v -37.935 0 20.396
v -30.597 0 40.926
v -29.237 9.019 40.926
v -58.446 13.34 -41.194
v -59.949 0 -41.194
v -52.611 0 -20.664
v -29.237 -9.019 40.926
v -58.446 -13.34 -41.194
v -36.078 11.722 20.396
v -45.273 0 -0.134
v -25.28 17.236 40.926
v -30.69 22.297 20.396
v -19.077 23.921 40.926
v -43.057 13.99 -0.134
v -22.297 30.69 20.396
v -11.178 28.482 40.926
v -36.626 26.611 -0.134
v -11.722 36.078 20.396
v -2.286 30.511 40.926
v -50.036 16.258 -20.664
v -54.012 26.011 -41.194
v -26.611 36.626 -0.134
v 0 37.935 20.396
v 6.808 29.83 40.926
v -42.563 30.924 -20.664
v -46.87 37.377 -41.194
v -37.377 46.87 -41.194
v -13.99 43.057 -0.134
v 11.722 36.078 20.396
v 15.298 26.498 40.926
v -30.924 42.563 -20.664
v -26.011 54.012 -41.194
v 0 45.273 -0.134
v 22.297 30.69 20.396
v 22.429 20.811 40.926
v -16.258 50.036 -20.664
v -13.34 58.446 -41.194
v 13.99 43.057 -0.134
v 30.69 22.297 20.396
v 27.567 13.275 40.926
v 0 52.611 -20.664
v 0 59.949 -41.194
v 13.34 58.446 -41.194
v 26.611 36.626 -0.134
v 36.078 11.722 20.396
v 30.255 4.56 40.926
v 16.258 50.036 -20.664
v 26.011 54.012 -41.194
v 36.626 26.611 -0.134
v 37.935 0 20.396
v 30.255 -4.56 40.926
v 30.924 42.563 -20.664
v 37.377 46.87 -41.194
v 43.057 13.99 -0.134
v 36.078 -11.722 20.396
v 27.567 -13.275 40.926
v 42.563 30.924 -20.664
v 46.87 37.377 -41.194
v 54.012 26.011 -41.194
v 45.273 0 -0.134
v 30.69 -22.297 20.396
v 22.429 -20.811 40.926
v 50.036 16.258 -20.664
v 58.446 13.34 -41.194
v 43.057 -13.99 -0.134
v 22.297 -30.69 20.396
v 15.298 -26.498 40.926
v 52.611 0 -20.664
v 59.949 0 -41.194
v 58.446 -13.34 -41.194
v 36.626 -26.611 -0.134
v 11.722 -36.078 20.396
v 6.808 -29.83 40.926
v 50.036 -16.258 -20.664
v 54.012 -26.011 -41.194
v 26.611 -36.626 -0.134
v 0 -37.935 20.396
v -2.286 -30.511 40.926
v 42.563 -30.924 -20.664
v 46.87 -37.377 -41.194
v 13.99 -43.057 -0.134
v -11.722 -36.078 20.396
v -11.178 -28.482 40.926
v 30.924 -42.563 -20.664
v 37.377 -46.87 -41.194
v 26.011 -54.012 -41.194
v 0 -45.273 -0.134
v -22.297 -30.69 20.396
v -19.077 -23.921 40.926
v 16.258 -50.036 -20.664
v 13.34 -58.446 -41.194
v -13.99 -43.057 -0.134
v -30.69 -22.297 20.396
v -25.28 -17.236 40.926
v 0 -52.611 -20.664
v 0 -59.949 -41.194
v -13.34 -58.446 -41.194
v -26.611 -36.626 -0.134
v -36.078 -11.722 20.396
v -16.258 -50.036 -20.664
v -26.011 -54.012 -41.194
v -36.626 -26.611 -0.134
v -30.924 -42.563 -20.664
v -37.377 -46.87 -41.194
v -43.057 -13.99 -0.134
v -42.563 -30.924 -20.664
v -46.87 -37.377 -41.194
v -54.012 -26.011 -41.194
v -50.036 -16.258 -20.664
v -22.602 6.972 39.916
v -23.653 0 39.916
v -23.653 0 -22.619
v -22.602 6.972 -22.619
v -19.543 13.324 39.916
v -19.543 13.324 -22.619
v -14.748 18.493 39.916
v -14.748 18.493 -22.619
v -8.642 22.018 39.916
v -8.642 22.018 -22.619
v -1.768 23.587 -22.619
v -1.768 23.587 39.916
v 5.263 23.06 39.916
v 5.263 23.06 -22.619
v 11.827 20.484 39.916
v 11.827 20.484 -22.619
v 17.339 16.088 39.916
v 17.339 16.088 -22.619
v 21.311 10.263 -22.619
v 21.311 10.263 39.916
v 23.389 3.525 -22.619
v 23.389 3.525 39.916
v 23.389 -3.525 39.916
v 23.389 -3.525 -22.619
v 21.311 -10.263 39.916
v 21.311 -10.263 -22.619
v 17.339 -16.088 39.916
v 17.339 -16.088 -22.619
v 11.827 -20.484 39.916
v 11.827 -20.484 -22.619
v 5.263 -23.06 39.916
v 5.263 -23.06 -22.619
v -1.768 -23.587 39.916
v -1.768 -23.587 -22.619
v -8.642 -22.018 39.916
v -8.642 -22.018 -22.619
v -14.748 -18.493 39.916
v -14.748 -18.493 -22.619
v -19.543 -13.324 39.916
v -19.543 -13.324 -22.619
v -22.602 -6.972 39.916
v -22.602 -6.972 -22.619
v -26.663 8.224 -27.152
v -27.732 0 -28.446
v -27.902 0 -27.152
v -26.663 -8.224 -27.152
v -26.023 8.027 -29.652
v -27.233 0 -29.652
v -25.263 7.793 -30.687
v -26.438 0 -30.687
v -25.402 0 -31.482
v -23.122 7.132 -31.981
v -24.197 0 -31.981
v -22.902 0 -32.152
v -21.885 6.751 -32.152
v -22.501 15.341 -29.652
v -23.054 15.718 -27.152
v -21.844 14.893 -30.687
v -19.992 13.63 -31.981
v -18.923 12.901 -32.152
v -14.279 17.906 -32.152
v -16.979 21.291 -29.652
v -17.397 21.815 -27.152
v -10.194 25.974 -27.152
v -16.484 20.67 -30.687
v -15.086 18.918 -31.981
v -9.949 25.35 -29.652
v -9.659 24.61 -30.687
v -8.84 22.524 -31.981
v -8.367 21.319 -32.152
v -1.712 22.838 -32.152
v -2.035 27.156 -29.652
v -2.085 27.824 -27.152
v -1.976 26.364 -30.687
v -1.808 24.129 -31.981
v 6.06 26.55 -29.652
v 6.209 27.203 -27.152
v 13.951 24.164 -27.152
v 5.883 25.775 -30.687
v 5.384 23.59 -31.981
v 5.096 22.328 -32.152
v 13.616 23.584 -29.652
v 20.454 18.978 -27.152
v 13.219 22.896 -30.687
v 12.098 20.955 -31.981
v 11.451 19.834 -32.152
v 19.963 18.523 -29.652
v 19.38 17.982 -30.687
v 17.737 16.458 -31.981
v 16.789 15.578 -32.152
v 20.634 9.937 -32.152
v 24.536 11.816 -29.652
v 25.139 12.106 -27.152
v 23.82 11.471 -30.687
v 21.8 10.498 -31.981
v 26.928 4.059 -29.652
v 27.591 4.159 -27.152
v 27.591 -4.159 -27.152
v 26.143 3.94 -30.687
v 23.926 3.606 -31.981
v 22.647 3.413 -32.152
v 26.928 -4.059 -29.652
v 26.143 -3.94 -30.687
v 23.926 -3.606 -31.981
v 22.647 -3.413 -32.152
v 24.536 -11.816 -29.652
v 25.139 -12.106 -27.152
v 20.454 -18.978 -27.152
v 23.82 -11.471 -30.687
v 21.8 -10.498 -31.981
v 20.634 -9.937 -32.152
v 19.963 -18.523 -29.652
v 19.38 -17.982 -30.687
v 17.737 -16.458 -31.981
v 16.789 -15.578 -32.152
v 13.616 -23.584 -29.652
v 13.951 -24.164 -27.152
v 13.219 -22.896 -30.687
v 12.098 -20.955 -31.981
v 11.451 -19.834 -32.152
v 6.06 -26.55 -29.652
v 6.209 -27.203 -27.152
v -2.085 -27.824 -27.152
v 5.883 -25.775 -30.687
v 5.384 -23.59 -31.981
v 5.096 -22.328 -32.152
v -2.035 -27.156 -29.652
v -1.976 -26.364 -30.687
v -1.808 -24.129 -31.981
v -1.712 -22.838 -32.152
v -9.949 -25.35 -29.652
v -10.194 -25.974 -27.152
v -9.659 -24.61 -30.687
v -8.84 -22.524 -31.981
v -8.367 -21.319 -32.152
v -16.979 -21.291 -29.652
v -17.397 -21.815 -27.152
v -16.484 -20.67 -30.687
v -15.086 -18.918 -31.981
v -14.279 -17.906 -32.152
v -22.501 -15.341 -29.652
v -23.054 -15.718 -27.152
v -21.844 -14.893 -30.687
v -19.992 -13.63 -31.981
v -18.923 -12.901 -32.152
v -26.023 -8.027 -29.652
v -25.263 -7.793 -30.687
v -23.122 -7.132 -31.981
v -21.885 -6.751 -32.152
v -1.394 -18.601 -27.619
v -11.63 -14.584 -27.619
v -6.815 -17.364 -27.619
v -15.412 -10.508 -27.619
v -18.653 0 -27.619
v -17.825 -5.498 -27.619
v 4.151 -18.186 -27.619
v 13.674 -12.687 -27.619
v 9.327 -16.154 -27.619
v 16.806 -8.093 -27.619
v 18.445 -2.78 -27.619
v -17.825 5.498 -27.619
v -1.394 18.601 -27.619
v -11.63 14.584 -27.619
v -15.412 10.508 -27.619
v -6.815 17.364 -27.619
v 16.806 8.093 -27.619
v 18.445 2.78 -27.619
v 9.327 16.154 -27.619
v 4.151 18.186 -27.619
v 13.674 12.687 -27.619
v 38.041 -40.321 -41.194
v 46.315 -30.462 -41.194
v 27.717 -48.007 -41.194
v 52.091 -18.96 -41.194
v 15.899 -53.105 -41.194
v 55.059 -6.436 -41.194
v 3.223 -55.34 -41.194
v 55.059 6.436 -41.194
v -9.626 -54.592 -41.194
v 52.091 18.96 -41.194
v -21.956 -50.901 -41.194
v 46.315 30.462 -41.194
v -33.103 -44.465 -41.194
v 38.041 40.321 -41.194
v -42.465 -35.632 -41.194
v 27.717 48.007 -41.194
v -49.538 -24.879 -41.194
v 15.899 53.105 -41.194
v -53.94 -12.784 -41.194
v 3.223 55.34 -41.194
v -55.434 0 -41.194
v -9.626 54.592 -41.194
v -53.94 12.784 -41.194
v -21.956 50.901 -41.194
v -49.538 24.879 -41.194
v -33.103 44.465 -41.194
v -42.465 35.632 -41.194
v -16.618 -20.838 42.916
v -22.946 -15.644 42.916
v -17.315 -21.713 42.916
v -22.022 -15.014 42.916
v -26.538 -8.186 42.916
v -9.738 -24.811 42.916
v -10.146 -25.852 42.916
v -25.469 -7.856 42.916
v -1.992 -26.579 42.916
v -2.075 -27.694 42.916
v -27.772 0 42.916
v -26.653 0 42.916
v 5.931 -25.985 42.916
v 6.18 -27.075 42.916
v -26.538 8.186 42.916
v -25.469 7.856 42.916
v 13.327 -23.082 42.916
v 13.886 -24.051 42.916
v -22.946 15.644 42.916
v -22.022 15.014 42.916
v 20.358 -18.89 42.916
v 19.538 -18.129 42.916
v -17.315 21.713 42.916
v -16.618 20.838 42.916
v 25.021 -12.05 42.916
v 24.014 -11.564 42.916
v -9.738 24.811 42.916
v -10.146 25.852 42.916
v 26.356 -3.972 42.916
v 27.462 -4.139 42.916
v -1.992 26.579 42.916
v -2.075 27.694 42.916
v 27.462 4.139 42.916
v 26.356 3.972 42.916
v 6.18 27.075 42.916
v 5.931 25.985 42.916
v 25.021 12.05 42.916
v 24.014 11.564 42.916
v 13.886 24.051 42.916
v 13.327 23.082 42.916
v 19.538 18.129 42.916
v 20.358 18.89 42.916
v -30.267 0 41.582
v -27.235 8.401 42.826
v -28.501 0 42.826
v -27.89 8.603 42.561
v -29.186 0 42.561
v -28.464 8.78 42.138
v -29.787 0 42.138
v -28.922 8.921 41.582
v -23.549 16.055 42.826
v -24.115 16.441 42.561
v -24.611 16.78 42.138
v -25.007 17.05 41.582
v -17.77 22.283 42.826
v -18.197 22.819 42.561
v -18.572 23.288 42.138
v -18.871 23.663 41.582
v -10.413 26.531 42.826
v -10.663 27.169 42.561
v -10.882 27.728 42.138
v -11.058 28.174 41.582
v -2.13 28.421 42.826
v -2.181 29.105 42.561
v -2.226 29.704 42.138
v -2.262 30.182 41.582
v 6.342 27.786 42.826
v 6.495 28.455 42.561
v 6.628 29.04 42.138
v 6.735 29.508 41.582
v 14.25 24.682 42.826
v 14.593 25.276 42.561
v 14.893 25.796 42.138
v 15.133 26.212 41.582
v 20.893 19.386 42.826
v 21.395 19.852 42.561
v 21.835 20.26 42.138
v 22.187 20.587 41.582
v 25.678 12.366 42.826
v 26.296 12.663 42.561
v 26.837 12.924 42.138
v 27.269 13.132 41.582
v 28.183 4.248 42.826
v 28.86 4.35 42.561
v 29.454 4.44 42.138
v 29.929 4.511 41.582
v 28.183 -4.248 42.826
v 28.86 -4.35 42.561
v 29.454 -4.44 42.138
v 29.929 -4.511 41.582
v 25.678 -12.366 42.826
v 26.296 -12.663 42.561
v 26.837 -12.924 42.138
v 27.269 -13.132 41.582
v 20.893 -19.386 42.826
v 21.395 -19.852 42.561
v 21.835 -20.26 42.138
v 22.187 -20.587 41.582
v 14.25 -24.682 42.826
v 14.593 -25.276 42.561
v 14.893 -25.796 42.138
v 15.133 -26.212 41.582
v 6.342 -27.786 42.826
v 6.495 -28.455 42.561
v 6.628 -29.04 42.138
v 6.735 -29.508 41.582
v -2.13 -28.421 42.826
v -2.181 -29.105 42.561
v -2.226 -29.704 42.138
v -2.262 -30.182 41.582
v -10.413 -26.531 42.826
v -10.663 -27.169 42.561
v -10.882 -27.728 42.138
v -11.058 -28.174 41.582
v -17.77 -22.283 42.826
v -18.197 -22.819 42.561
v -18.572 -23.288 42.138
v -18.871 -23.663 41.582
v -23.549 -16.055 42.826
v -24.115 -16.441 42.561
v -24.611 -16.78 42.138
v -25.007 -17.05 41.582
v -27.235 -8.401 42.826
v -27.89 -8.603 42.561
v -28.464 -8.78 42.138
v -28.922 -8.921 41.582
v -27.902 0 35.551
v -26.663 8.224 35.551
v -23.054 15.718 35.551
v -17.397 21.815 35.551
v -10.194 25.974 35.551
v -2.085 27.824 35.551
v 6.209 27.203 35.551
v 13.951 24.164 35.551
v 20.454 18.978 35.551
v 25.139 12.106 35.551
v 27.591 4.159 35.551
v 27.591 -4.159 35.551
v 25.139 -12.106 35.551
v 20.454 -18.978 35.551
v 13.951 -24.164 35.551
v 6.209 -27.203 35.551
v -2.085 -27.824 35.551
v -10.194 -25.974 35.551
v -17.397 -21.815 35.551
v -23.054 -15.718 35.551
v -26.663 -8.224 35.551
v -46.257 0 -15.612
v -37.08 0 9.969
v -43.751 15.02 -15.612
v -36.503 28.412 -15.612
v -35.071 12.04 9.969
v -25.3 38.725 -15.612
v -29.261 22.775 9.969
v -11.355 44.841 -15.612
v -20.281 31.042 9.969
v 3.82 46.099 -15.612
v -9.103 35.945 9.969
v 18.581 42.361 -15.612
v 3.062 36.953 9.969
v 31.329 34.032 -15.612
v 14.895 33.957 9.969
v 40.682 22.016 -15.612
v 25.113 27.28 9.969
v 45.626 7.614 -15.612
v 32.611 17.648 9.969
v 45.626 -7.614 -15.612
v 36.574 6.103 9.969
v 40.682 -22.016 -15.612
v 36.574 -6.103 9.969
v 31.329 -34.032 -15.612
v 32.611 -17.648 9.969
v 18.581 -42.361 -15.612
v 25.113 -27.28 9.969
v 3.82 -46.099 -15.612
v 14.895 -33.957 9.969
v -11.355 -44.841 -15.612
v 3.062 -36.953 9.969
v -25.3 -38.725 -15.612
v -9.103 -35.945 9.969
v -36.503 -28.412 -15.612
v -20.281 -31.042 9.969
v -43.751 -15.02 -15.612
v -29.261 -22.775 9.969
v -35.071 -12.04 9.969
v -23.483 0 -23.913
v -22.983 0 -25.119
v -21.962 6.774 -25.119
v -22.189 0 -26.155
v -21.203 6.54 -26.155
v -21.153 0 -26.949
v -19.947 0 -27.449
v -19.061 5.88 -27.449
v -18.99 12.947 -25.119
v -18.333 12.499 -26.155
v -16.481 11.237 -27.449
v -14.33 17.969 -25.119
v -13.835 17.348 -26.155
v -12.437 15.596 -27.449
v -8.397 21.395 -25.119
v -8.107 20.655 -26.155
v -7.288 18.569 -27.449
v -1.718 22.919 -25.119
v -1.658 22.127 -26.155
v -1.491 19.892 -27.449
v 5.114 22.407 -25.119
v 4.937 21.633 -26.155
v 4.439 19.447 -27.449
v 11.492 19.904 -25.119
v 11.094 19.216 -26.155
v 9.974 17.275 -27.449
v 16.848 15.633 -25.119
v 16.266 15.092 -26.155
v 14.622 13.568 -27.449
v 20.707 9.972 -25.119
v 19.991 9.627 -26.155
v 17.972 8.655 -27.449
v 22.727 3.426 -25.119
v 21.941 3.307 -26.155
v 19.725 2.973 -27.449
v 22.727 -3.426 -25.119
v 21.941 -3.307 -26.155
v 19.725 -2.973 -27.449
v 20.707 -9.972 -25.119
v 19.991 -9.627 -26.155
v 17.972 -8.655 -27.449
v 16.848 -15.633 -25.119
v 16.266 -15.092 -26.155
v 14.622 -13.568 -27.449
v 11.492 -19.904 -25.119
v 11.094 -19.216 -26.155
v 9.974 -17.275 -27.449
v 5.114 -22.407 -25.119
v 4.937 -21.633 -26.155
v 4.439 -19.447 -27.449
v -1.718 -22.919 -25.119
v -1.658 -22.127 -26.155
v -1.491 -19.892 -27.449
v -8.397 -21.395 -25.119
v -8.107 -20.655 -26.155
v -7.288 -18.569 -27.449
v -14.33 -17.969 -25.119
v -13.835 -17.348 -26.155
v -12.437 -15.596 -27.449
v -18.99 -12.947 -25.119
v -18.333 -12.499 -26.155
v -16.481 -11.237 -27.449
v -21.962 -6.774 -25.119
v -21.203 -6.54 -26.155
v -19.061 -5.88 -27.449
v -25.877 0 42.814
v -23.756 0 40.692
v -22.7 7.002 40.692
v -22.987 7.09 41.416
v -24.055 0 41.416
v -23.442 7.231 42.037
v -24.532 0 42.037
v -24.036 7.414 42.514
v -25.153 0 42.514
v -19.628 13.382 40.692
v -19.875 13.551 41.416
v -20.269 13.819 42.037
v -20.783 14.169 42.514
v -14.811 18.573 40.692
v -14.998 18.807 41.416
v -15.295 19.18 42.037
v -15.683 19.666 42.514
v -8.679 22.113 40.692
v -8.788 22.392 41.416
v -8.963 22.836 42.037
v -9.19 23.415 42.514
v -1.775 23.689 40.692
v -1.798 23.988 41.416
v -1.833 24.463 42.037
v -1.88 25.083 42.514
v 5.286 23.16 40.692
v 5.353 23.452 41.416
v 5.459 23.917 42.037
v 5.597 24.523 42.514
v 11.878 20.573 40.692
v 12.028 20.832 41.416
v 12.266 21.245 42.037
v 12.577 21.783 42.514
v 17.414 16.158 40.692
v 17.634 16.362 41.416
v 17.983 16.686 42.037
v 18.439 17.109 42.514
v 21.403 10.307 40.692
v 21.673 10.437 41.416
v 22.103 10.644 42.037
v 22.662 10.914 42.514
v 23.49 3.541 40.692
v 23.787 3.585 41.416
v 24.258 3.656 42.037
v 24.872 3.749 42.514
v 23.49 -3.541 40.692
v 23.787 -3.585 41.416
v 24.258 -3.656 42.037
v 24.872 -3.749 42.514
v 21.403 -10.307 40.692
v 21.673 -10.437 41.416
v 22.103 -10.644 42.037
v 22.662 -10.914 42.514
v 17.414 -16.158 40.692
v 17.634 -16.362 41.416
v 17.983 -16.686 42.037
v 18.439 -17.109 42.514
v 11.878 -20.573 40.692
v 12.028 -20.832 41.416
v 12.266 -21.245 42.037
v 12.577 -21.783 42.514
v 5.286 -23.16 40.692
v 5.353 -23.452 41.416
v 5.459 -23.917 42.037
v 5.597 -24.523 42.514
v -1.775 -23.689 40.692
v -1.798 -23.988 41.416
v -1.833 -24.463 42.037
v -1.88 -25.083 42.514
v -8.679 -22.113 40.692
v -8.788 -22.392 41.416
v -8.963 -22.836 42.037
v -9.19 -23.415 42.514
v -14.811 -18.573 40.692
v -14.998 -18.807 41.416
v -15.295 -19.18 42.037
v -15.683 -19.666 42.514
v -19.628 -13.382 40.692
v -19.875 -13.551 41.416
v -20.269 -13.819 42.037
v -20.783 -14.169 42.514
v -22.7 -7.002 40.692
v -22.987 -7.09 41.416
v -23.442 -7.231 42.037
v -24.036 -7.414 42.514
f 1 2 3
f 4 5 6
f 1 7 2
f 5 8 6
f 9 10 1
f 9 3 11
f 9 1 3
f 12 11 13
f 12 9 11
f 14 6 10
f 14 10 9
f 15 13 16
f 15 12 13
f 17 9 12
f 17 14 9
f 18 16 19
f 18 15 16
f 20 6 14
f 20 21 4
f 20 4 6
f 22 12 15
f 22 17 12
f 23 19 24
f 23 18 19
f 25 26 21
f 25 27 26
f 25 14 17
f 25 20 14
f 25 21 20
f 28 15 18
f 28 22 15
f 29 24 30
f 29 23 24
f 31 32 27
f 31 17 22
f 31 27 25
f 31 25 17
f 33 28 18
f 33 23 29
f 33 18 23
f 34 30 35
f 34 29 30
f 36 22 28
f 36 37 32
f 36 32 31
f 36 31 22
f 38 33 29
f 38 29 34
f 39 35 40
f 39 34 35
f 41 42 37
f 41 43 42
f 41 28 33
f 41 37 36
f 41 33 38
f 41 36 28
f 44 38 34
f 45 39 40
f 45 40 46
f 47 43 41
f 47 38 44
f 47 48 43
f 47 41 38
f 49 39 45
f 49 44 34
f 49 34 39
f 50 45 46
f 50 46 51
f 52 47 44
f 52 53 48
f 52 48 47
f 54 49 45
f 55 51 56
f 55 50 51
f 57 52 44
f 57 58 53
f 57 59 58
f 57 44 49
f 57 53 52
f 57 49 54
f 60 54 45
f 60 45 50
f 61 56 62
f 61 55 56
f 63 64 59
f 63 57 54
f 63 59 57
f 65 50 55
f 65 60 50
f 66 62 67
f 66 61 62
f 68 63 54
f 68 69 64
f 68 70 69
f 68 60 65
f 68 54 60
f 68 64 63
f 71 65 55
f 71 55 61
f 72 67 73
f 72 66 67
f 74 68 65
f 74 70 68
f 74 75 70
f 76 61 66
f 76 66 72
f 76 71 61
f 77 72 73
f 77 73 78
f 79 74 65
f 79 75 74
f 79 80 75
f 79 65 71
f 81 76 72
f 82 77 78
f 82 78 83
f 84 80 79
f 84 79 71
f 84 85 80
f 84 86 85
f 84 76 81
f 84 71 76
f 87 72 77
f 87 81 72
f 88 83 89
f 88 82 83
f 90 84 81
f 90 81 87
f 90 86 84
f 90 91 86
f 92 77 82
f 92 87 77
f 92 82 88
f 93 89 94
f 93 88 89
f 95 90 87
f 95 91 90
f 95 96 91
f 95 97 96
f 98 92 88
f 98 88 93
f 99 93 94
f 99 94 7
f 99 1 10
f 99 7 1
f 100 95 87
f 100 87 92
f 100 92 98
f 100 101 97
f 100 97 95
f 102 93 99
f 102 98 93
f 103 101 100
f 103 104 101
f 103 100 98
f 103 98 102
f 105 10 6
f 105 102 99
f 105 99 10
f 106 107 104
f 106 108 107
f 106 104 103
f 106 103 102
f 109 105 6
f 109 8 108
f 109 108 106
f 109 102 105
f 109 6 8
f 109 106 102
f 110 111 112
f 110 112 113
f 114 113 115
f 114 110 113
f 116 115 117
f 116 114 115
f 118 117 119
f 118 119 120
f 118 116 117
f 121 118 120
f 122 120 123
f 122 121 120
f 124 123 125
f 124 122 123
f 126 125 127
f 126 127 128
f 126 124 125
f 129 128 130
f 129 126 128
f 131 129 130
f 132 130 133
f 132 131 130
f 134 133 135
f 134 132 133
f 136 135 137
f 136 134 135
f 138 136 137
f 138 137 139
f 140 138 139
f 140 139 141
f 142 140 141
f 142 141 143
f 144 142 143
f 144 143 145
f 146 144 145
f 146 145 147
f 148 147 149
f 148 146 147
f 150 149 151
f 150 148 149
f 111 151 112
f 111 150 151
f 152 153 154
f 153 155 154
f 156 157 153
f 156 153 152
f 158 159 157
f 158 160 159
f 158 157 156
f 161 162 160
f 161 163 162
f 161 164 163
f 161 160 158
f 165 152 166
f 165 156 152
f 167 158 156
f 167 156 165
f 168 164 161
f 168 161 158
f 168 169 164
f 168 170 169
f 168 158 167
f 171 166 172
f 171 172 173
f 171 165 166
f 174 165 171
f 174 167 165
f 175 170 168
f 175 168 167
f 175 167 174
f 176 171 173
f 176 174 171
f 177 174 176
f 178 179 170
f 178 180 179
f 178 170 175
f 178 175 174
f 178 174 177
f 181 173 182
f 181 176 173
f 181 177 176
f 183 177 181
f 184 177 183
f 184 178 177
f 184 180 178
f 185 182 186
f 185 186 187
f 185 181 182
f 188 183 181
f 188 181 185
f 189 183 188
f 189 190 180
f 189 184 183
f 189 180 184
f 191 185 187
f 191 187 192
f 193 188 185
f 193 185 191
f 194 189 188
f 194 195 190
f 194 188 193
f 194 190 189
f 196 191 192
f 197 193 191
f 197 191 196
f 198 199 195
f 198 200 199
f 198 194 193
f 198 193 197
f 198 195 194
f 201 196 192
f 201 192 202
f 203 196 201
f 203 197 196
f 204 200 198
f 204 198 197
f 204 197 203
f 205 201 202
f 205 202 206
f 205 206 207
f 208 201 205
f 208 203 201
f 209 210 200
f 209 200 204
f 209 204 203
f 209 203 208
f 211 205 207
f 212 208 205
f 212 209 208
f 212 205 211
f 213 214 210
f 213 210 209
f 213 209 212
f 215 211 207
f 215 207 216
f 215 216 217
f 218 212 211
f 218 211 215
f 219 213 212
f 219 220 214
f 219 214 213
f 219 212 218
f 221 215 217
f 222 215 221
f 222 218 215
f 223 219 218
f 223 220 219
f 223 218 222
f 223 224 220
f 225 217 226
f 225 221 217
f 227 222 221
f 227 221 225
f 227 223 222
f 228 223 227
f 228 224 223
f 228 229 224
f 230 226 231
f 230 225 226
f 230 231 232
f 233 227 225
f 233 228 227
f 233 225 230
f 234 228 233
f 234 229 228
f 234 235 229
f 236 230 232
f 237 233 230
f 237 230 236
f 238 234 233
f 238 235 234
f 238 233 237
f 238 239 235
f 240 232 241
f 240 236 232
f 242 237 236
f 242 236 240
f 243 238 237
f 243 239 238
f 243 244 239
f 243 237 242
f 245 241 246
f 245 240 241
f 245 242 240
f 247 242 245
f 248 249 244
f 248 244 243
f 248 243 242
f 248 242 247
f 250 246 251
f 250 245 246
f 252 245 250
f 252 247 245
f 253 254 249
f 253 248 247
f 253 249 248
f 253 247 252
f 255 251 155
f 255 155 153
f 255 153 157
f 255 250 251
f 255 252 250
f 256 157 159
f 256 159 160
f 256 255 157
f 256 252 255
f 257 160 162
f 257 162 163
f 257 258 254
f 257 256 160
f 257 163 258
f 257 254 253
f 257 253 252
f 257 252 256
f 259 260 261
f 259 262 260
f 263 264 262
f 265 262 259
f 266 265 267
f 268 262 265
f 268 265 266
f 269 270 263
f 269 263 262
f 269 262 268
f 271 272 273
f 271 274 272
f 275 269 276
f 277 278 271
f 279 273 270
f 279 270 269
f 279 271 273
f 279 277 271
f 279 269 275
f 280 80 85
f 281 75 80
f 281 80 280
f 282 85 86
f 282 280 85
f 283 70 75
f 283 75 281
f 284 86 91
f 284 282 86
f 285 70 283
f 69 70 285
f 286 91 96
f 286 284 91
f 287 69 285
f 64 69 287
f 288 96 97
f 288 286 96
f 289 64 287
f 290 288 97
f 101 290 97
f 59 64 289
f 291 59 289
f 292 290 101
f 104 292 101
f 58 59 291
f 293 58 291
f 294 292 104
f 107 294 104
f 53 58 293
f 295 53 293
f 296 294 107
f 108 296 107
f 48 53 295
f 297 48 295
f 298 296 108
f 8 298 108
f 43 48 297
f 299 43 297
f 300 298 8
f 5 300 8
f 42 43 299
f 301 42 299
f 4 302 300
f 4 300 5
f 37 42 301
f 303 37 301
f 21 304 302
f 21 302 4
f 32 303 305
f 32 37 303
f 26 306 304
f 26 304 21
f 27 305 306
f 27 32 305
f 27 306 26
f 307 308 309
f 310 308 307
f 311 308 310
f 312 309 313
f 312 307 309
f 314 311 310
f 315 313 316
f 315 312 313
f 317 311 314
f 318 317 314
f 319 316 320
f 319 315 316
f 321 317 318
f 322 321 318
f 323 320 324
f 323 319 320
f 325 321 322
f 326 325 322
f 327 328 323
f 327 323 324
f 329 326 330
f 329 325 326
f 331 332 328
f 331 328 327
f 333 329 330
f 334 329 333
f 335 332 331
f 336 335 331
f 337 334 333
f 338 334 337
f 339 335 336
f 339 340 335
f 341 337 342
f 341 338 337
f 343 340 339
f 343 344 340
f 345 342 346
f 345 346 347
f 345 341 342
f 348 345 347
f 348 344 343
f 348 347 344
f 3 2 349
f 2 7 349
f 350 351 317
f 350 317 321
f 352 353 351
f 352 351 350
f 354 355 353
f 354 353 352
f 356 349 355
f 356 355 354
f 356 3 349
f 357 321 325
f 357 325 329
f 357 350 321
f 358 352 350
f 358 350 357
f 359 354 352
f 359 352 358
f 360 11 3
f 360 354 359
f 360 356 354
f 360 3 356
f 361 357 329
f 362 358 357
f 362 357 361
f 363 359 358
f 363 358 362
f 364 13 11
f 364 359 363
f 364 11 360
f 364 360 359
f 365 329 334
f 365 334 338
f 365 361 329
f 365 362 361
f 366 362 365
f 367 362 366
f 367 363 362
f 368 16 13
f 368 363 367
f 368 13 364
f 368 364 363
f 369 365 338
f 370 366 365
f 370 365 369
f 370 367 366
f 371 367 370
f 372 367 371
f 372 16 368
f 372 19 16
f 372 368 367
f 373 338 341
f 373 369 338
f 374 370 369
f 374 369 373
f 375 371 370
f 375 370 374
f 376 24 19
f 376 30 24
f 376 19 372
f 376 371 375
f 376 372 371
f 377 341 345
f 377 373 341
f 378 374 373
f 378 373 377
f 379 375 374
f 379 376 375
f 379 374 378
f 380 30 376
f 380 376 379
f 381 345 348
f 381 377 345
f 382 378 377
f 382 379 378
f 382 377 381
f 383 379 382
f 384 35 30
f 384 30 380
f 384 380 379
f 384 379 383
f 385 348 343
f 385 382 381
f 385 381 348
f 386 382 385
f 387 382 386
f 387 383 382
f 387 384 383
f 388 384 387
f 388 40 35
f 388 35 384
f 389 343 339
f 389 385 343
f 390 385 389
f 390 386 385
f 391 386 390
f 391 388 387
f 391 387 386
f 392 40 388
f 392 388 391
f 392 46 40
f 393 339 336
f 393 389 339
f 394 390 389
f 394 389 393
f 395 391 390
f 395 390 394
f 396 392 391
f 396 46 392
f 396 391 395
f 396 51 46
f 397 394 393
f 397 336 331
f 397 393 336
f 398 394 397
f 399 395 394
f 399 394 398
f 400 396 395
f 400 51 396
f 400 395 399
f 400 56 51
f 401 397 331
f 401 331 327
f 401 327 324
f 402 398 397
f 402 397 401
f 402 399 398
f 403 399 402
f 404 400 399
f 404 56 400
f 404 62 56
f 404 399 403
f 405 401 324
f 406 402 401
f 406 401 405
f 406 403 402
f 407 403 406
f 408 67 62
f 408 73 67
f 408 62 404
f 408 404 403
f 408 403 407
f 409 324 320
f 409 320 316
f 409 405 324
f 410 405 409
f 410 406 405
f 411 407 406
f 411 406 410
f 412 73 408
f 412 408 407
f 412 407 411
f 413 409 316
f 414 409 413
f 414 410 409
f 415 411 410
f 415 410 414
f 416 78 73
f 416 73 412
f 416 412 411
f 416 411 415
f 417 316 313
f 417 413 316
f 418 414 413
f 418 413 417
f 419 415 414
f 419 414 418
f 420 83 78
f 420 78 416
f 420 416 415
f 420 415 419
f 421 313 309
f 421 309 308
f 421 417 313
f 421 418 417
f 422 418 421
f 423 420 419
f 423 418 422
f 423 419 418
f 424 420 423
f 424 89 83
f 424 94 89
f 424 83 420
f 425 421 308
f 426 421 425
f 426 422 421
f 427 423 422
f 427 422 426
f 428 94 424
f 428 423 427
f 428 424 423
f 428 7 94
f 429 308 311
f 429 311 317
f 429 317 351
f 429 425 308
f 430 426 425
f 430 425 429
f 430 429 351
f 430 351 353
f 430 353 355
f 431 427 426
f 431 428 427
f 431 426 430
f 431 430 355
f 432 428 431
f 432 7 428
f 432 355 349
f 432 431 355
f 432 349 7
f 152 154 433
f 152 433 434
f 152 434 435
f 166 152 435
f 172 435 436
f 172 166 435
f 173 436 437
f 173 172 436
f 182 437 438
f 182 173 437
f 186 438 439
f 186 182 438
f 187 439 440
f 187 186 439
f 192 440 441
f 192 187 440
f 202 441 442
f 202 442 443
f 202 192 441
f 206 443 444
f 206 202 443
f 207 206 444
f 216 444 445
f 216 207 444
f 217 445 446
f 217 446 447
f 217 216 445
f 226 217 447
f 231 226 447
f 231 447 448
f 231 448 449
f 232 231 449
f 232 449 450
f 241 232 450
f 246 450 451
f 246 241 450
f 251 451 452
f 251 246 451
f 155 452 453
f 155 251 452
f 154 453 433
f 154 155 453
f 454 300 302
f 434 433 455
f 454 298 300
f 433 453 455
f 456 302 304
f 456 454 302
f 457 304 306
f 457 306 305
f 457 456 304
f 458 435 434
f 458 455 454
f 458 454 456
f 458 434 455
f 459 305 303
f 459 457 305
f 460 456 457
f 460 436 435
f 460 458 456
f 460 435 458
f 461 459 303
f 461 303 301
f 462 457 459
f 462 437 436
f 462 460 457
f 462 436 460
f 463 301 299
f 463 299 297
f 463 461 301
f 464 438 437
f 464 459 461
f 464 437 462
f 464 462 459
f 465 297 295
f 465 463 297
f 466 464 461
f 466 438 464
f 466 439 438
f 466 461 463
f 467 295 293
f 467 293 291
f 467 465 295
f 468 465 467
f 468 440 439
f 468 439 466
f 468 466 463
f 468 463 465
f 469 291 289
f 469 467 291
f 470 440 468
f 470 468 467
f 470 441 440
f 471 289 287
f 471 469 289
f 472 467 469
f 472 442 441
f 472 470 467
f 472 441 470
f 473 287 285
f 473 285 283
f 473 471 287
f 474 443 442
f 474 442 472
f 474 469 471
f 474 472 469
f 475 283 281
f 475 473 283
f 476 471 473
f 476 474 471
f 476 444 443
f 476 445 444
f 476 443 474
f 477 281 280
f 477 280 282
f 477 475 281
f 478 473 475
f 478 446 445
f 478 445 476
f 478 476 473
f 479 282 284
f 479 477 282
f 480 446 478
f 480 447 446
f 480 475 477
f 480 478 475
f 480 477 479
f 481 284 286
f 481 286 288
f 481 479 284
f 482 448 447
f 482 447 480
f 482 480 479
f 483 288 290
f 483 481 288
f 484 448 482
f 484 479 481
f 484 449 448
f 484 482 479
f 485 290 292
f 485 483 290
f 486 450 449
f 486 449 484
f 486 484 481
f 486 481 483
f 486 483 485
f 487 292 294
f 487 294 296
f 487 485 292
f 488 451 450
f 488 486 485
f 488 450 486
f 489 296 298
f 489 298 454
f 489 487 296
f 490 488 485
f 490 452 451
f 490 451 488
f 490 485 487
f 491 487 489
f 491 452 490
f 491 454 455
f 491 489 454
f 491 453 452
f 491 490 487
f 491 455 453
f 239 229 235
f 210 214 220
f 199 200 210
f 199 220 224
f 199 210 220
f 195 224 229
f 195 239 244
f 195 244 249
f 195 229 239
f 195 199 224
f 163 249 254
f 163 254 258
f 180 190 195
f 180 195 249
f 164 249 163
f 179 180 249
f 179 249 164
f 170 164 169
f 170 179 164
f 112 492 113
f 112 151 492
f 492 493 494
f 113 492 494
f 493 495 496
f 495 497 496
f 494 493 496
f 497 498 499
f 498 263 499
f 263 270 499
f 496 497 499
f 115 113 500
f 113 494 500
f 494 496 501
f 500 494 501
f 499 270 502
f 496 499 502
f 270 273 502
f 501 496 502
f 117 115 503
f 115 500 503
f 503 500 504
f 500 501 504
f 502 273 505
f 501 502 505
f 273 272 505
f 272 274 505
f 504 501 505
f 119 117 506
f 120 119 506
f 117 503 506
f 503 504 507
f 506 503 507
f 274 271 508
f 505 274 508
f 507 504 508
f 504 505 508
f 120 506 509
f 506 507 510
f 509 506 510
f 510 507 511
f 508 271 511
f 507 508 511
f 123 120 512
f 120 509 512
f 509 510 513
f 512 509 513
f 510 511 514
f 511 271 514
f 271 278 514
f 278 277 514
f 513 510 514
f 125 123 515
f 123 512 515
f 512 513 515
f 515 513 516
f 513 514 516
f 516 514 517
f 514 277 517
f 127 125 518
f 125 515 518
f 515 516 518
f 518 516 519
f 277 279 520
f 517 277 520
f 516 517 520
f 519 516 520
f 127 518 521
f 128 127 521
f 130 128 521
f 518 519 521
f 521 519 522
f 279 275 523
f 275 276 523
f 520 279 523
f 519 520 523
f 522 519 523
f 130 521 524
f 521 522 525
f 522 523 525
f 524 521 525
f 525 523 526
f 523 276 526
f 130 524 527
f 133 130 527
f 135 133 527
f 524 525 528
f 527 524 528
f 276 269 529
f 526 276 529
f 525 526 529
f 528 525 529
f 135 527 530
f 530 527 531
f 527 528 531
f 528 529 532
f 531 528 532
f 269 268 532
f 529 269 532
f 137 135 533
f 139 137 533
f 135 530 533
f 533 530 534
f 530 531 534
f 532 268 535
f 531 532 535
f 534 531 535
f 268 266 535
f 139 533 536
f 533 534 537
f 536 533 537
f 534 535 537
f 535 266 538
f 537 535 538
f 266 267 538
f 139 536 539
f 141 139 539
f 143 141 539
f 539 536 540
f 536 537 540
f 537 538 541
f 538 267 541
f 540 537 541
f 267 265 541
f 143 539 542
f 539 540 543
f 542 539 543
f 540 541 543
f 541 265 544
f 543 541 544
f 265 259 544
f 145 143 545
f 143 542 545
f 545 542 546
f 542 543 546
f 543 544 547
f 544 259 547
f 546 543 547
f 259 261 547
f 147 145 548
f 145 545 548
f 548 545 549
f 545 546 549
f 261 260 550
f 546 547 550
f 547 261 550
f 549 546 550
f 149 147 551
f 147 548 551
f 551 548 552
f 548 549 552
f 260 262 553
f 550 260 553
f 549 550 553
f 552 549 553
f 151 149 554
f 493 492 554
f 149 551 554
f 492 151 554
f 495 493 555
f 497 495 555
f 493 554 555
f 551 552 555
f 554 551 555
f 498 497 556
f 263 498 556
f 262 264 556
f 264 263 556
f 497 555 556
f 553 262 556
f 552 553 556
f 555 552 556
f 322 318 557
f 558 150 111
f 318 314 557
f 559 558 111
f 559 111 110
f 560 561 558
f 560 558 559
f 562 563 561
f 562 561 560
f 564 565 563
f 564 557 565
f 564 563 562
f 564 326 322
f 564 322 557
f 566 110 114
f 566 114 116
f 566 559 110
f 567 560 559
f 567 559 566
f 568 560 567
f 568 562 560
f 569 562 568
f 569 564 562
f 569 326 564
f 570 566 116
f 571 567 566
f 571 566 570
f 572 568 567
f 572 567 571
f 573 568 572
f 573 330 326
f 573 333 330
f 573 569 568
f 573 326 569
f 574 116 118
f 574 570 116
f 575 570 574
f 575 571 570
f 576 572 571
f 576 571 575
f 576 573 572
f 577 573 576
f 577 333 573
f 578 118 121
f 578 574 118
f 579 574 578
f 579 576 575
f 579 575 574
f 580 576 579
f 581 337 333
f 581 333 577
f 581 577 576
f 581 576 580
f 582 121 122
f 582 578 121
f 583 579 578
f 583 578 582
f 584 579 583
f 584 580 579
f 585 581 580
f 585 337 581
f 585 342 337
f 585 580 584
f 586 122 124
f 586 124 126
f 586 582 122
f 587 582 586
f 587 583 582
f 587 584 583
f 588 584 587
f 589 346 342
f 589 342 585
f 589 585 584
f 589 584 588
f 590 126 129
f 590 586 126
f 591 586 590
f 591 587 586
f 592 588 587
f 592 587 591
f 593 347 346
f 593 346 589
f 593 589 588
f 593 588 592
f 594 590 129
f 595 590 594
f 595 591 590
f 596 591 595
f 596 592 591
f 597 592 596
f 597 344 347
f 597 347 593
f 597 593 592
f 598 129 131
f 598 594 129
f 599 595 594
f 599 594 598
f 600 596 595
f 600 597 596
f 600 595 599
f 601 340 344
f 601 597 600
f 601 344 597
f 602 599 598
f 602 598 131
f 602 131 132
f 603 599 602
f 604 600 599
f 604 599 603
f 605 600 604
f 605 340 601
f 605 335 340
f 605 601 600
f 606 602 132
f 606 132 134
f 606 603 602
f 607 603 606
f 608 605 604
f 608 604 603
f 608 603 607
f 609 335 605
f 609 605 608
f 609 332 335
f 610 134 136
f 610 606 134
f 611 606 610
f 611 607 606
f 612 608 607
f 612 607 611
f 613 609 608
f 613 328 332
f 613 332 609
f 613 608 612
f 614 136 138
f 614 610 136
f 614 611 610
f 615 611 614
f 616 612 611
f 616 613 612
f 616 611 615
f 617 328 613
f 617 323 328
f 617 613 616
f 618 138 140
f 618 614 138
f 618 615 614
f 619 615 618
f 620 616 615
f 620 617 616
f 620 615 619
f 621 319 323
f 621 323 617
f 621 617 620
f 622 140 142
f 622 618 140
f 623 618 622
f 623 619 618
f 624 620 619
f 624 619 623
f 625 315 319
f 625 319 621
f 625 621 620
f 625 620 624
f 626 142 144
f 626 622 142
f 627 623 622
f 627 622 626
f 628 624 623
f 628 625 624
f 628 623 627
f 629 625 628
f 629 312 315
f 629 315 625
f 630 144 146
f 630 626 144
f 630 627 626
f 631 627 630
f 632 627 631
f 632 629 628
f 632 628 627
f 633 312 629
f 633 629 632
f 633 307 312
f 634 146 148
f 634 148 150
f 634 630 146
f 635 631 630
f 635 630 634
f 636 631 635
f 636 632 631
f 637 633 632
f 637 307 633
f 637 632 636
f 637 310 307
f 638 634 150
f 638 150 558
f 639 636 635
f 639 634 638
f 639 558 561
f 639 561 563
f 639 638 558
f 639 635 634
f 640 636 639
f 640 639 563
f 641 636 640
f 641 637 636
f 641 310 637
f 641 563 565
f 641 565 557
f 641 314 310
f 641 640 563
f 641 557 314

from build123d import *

# Parameters (mm, degrees)
F2_R = 3
F3_R = 5
F4_R = 5


with BuildPart() as f1:
    # F0 (on Front) → F1 (revolve)
    with BuildSketch(Plane.XZ):
        Polygon((0, -32.151528), (0, -27.619155), (-23.653328, -27.619155), (-23.653328, 42.915918), (-29.885342, 42.915918), (-59.948665, -41.193824), (-55.434137, -41.193824), (-27.90243, 35.55081), (-27.90243, -32.151528), (-23.370055, -32.151528), align=None)
    revolve(axis=Axis((0, 0, -29.885341), (0, 0, -1)))

    # F2
    f2_edges = [f1.edges().sort_by_distance(p)[0] for p in [
        (29.885342, 0, 42.915918),
        (23.653328, 0, 42.915918),
    ]]
    fillet(f2_edges, radius=F2_R)

    # F3
    f3_edges = [f1.edges().sort_by_distance(p)[0] for p in [
        (23.653328, 0, -27.619155),
    ]]
    fillet(f3_edges, radius=F3_R)

    # F4
    f4_edges = [f1.edges().sort_by_distance(p)[0] for p in [
        (27.90243, 0, -32.151528),
    ]]
    fillet(f4_edges, radius=F4_R)


solid = f1.part
